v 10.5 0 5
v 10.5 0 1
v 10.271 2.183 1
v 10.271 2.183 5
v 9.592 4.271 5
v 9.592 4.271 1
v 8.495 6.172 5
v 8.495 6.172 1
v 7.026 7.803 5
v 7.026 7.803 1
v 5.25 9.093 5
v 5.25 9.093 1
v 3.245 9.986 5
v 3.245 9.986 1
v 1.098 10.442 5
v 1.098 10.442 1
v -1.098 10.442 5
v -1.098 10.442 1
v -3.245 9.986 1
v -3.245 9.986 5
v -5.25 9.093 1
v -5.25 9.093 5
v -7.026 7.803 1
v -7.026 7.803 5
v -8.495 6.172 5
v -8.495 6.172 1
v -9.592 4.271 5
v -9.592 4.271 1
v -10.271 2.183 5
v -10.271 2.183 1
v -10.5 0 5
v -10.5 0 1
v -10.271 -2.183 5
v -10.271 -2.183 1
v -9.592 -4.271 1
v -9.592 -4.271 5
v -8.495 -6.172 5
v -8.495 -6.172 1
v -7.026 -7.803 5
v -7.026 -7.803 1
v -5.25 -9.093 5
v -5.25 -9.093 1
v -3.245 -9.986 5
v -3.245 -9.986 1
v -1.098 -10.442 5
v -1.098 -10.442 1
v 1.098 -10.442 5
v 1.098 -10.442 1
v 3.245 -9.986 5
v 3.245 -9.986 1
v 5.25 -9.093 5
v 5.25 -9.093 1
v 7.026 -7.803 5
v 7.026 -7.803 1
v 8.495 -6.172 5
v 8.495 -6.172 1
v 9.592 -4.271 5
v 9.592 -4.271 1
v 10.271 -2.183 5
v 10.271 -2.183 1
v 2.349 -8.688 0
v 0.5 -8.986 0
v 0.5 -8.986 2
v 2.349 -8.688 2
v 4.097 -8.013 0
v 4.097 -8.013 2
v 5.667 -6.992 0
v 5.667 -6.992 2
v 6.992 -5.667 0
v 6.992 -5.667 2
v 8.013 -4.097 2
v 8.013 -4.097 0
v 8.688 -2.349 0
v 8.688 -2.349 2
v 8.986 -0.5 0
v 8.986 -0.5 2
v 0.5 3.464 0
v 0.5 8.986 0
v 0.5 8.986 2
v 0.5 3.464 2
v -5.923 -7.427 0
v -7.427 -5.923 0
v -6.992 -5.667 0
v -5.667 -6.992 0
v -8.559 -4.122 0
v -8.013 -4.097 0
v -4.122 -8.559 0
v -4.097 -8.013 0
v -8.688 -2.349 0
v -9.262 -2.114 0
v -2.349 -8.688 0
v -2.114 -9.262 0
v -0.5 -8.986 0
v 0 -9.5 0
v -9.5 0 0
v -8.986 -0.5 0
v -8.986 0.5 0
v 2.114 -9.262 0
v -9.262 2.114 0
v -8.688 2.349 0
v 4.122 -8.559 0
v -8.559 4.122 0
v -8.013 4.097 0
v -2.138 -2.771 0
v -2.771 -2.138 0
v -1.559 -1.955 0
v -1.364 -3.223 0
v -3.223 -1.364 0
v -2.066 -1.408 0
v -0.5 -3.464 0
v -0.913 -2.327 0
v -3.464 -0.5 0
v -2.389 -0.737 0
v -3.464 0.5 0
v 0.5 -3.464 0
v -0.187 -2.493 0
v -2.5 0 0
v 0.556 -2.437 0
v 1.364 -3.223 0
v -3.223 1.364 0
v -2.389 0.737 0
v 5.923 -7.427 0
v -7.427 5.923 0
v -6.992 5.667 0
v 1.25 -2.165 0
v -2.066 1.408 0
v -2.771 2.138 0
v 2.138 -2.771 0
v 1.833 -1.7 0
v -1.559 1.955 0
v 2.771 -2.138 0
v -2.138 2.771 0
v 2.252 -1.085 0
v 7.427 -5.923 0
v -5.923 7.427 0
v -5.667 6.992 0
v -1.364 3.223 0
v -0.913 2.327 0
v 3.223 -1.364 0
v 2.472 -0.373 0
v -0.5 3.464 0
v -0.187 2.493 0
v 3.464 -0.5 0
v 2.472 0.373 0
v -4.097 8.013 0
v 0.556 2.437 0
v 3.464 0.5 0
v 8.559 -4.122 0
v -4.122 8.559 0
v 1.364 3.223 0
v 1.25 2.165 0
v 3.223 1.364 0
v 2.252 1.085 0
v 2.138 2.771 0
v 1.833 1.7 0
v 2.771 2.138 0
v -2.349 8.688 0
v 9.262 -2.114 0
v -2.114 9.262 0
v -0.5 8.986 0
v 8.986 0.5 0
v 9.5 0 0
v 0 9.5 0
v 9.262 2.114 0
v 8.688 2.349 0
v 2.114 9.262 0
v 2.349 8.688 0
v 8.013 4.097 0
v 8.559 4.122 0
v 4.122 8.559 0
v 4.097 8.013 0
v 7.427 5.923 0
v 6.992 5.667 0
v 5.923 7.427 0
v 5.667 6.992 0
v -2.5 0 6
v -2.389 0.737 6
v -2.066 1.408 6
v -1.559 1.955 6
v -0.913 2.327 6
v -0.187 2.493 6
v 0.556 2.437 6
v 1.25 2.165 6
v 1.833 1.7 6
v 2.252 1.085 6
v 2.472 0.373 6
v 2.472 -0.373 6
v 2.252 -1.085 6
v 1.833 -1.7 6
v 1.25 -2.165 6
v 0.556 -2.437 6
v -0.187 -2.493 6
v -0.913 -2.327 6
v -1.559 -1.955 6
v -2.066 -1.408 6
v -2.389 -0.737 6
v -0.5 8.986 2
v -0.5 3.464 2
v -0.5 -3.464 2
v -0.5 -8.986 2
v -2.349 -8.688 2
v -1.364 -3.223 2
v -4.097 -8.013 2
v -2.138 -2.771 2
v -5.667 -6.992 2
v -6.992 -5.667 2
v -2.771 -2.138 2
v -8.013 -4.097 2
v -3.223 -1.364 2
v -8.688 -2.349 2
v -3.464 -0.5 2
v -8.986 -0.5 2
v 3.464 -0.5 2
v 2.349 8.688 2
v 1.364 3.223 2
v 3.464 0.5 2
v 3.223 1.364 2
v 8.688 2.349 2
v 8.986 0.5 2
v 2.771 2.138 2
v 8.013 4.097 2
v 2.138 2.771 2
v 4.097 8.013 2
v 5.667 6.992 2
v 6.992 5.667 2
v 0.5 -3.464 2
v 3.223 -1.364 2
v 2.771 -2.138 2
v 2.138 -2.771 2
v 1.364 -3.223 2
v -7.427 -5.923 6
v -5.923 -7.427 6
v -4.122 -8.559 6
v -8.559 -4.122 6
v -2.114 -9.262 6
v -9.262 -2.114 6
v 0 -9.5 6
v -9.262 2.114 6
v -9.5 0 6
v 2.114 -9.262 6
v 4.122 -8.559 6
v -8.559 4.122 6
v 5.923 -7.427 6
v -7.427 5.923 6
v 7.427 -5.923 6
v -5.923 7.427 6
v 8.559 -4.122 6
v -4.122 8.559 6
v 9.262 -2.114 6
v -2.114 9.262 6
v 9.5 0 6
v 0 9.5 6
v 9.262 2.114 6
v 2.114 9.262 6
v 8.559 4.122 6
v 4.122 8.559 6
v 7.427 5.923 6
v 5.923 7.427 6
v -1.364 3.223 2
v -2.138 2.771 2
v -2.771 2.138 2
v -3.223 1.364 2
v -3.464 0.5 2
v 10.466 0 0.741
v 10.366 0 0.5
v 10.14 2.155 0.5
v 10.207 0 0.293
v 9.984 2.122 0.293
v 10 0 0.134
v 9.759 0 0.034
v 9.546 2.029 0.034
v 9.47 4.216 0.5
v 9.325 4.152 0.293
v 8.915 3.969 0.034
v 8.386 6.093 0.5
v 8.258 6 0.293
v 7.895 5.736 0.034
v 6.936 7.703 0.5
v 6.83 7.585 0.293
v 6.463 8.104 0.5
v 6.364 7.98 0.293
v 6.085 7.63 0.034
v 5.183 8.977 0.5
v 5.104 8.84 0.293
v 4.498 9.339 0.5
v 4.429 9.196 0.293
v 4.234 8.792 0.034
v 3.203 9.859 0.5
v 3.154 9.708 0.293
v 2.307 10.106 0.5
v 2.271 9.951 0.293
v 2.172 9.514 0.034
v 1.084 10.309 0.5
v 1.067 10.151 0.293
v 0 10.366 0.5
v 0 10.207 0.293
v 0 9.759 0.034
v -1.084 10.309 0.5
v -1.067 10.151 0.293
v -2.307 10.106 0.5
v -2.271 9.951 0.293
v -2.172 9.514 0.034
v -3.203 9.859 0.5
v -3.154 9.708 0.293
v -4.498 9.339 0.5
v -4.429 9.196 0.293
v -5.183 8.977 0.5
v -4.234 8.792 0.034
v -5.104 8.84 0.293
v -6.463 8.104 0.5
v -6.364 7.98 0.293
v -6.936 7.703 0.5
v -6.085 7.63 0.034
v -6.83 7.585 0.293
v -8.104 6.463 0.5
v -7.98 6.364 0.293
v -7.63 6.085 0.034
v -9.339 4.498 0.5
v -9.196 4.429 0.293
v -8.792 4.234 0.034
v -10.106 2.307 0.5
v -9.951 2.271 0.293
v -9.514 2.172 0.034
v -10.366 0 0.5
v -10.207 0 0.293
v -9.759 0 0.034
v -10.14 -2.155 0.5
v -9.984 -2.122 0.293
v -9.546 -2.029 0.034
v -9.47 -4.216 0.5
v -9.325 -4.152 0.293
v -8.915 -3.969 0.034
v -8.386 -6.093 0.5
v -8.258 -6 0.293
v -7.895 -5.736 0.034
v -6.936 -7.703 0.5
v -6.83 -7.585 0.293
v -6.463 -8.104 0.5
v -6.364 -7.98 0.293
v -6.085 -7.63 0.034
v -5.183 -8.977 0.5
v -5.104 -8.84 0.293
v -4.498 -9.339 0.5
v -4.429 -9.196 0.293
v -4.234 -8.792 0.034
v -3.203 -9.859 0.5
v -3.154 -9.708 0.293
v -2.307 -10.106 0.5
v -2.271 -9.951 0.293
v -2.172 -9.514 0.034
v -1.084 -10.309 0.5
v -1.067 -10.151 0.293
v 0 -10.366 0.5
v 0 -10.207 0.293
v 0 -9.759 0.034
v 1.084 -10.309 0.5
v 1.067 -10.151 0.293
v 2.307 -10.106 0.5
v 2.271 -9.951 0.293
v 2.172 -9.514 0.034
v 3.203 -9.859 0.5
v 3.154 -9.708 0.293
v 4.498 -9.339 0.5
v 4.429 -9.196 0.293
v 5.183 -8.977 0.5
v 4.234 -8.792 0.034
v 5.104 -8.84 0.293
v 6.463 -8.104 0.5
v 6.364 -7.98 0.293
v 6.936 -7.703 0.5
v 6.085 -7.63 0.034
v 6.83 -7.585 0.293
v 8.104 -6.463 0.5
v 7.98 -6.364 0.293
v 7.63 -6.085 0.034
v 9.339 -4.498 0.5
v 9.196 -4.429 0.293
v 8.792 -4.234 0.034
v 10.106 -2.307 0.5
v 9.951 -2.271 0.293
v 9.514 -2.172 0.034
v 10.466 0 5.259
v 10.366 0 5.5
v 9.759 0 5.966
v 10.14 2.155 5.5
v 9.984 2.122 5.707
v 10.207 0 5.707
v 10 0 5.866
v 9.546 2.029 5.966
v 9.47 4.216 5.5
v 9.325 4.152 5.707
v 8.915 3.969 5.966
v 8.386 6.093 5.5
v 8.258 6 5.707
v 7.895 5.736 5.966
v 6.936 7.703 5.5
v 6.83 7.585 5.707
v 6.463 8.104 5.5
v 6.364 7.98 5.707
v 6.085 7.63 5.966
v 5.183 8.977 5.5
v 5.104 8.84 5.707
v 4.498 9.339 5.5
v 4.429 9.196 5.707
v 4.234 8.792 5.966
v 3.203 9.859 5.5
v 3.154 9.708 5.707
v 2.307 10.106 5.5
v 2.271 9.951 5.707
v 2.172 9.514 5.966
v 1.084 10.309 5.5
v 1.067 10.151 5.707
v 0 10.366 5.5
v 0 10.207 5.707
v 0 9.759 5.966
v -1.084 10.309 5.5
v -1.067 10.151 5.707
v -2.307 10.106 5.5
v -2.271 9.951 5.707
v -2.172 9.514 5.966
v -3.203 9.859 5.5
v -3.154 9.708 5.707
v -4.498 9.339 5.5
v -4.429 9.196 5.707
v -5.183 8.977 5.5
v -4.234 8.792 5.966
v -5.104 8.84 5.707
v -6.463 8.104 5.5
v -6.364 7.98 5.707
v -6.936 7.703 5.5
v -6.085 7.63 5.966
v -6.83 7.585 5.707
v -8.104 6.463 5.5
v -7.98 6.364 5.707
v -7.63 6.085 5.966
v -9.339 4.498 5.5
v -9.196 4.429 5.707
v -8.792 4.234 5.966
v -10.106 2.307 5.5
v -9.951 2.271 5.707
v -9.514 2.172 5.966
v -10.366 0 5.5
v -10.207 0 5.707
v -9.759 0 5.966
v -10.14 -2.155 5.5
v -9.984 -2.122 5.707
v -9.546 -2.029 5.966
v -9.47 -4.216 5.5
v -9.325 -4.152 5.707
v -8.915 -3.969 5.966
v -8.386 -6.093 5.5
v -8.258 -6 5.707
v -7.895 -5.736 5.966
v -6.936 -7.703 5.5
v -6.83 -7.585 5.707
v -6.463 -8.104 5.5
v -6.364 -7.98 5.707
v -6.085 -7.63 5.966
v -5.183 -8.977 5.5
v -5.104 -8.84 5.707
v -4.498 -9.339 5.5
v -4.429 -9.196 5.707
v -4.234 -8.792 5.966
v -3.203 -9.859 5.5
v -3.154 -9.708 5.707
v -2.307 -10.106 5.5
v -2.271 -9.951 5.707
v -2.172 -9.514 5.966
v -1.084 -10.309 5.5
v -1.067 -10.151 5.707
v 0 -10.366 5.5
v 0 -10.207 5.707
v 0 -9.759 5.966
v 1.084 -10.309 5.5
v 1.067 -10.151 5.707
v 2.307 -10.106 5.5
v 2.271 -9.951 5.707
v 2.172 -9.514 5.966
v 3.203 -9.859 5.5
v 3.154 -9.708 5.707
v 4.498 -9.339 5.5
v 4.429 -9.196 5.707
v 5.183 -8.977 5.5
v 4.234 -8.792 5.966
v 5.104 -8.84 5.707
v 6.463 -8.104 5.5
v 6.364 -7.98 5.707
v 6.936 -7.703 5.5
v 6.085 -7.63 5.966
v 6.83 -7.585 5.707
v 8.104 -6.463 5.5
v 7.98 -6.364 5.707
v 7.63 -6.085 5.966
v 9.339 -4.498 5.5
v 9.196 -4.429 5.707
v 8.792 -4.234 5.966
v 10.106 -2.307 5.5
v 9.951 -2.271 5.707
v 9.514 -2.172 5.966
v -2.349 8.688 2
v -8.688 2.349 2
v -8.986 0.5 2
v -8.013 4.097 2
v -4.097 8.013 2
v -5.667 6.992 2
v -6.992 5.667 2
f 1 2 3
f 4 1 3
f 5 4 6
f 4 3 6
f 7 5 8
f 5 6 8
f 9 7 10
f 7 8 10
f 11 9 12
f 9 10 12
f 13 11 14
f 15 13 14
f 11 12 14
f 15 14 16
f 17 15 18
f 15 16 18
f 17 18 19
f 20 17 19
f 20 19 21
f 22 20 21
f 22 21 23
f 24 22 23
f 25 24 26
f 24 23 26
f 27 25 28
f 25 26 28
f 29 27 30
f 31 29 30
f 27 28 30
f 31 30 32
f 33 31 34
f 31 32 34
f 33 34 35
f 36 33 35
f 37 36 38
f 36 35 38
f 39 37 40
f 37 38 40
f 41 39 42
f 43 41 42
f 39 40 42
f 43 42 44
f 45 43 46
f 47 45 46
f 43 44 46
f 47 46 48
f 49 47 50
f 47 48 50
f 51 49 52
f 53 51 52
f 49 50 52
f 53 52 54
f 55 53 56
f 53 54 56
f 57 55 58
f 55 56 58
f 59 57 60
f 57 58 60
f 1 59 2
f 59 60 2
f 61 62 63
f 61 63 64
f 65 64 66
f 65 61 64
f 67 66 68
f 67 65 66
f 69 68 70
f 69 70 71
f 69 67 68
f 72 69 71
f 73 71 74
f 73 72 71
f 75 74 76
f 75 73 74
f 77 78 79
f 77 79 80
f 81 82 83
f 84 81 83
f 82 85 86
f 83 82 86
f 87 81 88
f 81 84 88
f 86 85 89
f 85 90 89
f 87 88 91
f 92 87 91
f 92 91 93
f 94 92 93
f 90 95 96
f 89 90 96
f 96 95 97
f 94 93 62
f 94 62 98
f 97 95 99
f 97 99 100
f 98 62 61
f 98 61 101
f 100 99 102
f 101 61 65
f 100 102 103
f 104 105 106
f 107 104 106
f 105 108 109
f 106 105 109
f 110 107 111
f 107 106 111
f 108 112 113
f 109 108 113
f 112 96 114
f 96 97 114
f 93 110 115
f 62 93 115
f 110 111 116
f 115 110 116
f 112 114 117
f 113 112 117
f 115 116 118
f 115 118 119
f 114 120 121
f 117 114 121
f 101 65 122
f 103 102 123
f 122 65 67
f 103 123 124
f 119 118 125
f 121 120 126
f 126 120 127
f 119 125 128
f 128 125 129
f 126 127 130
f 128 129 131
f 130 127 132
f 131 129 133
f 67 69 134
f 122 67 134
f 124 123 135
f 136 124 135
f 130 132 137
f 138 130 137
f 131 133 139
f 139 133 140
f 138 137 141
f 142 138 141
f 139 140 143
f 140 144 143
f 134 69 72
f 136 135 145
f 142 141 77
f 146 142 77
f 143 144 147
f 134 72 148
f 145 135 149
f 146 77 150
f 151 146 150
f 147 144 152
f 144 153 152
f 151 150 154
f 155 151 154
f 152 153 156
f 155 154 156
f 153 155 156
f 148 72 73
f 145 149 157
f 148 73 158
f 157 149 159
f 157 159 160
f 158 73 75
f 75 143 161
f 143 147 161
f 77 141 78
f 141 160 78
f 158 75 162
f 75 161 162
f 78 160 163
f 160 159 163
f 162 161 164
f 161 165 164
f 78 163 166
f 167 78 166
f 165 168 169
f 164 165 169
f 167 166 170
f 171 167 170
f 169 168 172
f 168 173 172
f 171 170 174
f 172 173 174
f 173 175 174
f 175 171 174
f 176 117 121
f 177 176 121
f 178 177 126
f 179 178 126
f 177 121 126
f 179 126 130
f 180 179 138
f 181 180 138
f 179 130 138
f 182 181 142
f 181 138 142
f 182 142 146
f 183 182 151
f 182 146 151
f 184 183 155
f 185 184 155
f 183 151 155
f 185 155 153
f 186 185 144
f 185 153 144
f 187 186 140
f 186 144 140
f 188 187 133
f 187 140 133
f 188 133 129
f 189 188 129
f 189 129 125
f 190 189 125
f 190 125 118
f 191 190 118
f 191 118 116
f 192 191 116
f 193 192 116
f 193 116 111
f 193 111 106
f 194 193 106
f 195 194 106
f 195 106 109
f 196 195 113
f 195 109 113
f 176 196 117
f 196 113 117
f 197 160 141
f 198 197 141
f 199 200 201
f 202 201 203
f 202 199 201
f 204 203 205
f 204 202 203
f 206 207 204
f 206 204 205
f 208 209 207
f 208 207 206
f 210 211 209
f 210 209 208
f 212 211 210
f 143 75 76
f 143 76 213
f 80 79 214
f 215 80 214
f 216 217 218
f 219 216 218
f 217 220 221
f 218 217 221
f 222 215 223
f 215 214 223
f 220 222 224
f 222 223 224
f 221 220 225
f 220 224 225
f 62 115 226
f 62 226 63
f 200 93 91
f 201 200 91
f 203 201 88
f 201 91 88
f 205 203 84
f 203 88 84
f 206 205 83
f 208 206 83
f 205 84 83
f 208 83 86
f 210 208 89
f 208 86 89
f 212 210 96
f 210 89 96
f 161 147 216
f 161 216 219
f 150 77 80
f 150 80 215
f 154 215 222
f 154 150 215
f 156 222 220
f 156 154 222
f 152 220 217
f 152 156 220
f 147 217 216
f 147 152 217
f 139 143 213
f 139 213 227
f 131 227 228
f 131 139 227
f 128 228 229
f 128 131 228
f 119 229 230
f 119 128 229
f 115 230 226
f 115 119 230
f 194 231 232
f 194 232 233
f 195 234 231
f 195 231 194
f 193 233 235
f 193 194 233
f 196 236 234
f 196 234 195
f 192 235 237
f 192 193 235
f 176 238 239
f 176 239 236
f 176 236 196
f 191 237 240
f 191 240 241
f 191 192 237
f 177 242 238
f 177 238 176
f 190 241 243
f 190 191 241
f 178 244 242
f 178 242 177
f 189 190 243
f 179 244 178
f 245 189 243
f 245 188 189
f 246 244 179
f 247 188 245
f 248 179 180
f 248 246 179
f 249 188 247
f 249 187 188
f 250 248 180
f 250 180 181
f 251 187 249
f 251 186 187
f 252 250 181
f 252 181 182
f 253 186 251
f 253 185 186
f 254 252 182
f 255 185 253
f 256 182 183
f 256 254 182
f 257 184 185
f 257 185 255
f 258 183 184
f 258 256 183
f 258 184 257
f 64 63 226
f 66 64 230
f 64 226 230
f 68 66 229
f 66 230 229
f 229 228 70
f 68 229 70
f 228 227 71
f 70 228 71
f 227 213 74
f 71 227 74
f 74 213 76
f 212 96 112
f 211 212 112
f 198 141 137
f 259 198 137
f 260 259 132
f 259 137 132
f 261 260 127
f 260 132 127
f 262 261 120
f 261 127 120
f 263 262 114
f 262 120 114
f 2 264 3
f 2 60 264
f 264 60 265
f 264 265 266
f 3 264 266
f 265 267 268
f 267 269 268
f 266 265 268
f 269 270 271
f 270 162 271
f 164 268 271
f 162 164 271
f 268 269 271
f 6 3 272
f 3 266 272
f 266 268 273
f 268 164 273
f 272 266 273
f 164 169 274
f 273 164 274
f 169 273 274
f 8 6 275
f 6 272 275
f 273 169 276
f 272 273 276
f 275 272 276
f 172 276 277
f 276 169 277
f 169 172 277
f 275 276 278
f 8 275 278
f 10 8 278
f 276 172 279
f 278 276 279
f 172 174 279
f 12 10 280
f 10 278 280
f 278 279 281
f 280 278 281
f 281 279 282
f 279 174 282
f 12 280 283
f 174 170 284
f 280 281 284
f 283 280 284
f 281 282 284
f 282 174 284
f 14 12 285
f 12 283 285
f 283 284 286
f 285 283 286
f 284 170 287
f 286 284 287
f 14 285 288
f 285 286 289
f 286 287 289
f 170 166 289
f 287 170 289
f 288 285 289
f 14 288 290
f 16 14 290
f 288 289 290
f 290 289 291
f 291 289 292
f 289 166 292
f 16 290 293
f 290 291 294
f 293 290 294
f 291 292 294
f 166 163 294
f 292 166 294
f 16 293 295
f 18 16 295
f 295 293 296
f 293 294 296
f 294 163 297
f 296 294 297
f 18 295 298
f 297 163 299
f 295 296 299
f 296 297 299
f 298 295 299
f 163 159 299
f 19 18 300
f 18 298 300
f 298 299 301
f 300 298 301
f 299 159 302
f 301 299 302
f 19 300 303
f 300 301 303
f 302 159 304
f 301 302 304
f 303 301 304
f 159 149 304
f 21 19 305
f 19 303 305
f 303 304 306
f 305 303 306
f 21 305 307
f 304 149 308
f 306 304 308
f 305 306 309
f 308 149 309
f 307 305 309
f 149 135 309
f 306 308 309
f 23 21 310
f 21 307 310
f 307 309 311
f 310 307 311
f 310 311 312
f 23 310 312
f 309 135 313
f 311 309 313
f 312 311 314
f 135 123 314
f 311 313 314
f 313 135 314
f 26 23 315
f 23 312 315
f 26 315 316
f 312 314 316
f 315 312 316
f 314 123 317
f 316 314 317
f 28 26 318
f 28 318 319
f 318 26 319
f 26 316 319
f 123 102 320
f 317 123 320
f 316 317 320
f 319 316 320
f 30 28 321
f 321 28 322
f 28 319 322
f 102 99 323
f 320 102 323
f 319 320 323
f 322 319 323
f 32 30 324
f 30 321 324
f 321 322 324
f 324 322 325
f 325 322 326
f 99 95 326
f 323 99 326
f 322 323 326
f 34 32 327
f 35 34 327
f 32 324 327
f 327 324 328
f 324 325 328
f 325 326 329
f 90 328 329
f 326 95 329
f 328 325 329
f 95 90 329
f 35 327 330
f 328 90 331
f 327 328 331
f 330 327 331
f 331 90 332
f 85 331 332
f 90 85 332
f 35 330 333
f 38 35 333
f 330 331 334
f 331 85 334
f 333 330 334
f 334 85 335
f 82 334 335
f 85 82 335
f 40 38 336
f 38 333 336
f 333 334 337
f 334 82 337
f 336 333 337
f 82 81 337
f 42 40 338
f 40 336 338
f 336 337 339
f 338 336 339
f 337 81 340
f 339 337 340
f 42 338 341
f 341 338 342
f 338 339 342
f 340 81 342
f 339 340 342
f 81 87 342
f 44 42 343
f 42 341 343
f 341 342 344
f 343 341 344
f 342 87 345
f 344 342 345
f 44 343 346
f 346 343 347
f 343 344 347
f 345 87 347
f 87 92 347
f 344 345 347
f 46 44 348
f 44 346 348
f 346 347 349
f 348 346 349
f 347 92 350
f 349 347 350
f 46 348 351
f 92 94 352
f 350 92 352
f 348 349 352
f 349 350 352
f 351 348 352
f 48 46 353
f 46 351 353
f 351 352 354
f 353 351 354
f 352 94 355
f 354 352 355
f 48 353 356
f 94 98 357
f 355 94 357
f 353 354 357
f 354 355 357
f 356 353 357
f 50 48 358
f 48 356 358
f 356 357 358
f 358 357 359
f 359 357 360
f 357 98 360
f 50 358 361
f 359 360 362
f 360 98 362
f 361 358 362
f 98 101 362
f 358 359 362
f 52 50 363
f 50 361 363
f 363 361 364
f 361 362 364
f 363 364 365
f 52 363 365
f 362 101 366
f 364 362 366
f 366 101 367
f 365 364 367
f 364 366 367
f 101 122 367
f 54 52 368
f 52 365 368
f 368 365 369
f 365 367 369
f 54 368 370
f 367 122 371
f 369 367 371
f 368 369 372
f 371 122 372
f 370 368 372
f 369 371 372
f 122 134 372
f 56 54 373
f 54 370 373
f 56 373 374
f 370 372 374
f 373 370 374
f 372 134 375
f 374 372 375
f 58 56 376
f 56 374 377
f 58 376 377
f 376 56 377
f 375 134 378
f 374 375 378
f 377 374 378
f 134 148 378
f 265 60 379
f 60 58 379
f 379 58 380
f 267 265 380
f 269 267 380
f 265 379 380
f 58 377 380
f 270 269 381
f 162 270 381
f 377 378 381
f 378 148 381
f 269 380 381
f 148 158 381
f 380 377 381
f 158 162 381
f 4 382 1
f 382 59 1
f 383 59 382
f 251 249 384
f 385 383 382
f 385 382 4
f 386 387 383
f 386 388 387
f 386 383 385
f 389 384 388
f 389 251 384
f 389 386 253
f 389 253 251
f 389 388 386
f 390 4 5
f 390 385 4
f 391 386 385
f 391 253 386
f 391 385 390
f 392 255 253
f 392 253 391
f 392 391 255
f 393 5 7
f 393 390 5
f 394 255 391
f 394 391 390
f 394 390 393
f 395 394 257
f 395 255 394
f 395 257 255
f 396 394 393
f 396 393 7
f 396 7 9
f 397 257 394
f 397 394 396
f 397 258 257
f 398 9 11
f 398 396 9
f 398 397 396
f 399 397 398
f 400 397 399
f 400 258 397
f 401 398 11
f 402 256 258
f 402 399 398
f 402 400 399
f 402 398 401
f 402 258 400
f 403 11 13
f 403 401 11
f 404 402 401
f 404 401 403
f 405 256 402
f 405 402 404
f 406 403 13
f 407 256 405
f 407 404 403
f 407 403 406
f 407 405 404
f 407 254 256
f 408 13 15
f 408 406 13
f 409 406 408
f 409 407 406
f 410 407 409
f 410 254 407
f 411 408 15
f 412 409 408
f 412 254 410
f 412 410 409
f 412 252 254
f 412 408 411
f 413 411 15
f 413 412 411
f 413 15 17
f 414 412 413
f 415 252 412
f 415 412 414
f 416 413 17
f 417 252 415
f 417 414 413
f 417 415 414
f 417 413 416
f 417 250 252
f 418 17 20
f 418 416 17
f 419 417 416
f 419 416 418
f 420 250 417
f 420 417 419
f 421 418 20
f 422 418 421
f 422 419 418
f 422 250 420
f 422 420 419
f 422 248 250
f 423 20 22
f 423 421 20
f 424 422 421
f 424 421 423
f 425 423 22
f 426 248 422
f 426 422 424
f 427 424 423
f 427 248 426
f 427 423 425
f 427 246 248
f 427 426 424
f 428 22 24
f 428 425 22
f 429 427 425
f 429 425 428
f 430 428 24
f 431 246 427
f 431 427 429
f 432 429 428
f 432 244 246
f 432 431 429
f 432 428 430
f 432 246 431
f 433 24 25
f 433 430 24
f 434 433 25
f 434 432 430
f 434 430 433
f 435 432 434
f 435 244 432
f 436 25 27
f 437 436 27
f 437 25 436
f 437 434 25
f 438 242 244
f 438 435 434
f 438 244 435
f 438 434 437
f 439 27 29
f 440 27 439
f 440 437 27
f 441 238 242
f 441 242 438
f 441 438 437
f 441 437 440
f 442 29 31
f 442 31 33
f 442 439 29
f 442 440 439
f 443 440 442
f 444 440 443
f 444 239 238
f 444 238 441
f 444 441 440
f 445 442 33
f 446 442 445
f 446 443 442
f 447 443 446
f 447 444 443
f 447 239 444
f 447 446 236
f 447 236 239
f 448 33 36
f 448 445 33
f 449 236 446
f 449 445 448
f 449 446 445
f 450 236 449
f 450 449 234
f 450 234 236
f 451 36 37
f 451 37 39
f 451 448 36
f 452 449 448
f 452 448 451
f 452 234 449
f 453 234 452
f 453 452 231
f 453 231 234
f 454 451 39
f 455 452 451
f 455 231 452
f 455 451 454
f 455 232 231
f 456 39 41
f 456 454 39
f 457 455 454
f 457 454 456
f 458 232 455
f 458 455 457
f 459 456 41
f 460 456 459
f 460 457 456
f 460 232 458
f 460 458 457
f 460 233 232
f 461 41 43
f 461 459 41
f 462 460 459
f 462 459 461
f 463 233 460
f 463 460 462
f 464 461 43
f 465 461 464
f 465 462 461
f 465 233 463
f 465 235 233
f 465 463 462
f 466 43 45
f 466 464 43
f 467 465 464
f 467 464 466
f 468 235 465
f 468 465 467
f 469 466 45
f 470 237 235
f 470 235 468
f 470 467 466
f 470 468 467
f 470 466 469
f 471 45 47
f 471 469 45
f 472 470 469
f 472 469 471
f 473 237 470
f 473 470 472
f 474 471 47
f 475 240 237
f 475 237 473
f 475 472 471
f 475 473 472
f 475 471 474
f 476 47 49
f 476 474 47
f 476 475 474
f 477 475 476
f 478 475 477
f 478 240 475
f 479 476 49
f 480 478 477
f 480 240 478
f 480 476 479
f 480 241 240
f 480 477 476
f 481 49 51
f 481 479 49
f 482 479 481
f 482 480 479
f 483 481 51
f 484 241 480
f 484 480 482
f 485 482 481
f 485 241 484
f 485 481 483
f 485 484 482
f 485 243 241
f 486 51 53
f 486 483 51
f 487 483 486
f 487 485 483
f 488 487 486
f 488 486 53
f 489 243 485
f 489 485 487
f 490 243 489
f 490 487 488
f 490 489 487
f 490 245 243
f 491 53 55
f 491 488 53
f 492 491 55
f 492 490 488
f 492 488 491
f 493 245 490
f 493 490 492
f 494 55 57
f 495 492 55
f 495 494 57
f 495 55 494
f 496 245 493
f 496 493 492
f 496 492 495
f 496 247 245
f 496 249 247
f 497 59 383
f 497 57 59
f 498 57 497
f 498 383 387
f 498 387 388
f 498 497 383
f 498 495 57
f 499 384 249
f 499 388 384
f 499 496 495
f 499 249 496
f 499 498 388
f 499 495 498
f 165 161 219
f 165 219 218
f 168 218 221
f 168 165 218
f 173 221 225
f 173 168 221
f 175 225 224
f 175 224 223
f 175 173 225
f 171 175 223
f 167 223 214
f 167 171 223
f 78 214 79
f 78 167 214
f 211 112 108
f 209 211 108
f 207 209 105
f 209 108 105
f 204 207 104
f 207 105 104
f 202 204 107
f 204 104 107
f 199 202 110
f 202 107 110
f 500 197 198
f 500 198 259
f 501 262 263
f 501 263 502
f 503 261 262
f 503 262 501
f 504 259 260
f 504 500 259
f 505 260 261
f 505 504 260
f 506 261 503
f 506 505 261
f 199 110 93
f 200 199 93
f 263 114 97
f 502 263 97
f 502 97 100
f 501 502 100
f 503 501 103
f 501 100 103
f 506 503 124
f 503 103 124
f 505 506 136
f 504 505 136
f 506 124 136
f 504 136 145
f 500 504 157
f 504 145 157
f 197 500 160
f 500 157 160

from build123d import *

# Parameters (mm, degrees)
SKETCH1_R           = 10.5
BOSS_EXTRUDE1_DEPTH = 6
SKETCH2_R           = 2.5
CUT_EXTRUDE1_DEPTH  = 6
FILLET1_R           = 1
CUT_EXTRUDE2_DEPTH  = 2


with BuildPart() as part:
    # Sketch1 → Boss-Extrude1 (new body)
    with BuildSketch(Plane.XY):
        Circle(SKETCH1_R)
    extrude(amount=BOSS_EXTRUDE1_DEPTH)

    # Sketch2 → Cut-Extrude1 (cut)
    with BuildSketch(Plane(origin=(0, 0, 0), x_dir=(-1, 0, 0), z_dir=(0, 0, -1))):
        Circle(SKETCH2_R)
    extrude(amount=-CUT_EXTRUDE1_DEPTH, mode=Mode.SUBTRACT)

    # Fillet1
    fillet1_edges = [part.edges().sort_by_distance(p)[0] for p in [
        (-10.5, 0, 0),
        (-10.5, 0, 6),
    ]]
    fillet(fillet1_edges, radius=FILLET1_R)

    # Sketch3 → Cut-Extrude2 (cut)
    with BuildSketch(Plane(origin=(0, 0, 0), x_dir=(-1, 0, 0), z_dir=(0, 0, -1))):
        with BuildLine():
            Line((-0.5, 8.986100378), (-0.5, 3.464101615))
            ThreePointArc((-0.5, 3.464101615), (-2.474873734, 2.474873734), (-3.464101615, 0.5))
            Line((-3.464101615, 0.5), (-8.986100378, 0.5))
            ThreePointArc((-8.986100378, 0.5), (-6.363961031, 6.363961031), (-0.5, 8.986100378))
        make_face()
        with BuildLine():
            Line((0.5, 8.986100378), (0.5, 3.464101615))
            ThreePointArc((0.5, 3.464101615), (2.474873734, 2.474873734), (3.464101615, 0.5))
            Line((3.464101615, 0.5), (8.986100378, 0.5))
            ThreePointArc((8.986100378, 0.5), (6.363961031, 6.363961031), (0.5, 8.986100378))
        make_face()
        with BuildLine():
            Line((-8.986100378, -0.5), (-3.464101615, -0.5))
            ThreePointArc((-3.464101615, -0.5), (-2.474873734, -2.474873734), (-0.5, -3.464101615))
            Line((-0.5, -3.464101615), (-0.5, -8.986100378))
            ThreePointArc((-0.5, -8.986100378), (-6.363961031, -6.363961031), (-8.986100378, -0.5))
        make_face()
        with BuildLine():
            Line((0.5, -3.464101615), (0.5, -8.986100378))
            ThreePointArc((0.5, -8.986100378), (6.363961031, -6.363961031), (8.986100378, -0.5))
            Line((8.986100378, -0.5), (3.464101615, -0.5))
            ThreePointArc((3.464101615, -0.5), (2.474873734, -2.474873734), (0.5, -3.464101615))
        make_face()
    extrude(amount=-CUT_EXTRUDE2_DEPTH, mode=Mode.SUBTRACT)


solid = part.part
